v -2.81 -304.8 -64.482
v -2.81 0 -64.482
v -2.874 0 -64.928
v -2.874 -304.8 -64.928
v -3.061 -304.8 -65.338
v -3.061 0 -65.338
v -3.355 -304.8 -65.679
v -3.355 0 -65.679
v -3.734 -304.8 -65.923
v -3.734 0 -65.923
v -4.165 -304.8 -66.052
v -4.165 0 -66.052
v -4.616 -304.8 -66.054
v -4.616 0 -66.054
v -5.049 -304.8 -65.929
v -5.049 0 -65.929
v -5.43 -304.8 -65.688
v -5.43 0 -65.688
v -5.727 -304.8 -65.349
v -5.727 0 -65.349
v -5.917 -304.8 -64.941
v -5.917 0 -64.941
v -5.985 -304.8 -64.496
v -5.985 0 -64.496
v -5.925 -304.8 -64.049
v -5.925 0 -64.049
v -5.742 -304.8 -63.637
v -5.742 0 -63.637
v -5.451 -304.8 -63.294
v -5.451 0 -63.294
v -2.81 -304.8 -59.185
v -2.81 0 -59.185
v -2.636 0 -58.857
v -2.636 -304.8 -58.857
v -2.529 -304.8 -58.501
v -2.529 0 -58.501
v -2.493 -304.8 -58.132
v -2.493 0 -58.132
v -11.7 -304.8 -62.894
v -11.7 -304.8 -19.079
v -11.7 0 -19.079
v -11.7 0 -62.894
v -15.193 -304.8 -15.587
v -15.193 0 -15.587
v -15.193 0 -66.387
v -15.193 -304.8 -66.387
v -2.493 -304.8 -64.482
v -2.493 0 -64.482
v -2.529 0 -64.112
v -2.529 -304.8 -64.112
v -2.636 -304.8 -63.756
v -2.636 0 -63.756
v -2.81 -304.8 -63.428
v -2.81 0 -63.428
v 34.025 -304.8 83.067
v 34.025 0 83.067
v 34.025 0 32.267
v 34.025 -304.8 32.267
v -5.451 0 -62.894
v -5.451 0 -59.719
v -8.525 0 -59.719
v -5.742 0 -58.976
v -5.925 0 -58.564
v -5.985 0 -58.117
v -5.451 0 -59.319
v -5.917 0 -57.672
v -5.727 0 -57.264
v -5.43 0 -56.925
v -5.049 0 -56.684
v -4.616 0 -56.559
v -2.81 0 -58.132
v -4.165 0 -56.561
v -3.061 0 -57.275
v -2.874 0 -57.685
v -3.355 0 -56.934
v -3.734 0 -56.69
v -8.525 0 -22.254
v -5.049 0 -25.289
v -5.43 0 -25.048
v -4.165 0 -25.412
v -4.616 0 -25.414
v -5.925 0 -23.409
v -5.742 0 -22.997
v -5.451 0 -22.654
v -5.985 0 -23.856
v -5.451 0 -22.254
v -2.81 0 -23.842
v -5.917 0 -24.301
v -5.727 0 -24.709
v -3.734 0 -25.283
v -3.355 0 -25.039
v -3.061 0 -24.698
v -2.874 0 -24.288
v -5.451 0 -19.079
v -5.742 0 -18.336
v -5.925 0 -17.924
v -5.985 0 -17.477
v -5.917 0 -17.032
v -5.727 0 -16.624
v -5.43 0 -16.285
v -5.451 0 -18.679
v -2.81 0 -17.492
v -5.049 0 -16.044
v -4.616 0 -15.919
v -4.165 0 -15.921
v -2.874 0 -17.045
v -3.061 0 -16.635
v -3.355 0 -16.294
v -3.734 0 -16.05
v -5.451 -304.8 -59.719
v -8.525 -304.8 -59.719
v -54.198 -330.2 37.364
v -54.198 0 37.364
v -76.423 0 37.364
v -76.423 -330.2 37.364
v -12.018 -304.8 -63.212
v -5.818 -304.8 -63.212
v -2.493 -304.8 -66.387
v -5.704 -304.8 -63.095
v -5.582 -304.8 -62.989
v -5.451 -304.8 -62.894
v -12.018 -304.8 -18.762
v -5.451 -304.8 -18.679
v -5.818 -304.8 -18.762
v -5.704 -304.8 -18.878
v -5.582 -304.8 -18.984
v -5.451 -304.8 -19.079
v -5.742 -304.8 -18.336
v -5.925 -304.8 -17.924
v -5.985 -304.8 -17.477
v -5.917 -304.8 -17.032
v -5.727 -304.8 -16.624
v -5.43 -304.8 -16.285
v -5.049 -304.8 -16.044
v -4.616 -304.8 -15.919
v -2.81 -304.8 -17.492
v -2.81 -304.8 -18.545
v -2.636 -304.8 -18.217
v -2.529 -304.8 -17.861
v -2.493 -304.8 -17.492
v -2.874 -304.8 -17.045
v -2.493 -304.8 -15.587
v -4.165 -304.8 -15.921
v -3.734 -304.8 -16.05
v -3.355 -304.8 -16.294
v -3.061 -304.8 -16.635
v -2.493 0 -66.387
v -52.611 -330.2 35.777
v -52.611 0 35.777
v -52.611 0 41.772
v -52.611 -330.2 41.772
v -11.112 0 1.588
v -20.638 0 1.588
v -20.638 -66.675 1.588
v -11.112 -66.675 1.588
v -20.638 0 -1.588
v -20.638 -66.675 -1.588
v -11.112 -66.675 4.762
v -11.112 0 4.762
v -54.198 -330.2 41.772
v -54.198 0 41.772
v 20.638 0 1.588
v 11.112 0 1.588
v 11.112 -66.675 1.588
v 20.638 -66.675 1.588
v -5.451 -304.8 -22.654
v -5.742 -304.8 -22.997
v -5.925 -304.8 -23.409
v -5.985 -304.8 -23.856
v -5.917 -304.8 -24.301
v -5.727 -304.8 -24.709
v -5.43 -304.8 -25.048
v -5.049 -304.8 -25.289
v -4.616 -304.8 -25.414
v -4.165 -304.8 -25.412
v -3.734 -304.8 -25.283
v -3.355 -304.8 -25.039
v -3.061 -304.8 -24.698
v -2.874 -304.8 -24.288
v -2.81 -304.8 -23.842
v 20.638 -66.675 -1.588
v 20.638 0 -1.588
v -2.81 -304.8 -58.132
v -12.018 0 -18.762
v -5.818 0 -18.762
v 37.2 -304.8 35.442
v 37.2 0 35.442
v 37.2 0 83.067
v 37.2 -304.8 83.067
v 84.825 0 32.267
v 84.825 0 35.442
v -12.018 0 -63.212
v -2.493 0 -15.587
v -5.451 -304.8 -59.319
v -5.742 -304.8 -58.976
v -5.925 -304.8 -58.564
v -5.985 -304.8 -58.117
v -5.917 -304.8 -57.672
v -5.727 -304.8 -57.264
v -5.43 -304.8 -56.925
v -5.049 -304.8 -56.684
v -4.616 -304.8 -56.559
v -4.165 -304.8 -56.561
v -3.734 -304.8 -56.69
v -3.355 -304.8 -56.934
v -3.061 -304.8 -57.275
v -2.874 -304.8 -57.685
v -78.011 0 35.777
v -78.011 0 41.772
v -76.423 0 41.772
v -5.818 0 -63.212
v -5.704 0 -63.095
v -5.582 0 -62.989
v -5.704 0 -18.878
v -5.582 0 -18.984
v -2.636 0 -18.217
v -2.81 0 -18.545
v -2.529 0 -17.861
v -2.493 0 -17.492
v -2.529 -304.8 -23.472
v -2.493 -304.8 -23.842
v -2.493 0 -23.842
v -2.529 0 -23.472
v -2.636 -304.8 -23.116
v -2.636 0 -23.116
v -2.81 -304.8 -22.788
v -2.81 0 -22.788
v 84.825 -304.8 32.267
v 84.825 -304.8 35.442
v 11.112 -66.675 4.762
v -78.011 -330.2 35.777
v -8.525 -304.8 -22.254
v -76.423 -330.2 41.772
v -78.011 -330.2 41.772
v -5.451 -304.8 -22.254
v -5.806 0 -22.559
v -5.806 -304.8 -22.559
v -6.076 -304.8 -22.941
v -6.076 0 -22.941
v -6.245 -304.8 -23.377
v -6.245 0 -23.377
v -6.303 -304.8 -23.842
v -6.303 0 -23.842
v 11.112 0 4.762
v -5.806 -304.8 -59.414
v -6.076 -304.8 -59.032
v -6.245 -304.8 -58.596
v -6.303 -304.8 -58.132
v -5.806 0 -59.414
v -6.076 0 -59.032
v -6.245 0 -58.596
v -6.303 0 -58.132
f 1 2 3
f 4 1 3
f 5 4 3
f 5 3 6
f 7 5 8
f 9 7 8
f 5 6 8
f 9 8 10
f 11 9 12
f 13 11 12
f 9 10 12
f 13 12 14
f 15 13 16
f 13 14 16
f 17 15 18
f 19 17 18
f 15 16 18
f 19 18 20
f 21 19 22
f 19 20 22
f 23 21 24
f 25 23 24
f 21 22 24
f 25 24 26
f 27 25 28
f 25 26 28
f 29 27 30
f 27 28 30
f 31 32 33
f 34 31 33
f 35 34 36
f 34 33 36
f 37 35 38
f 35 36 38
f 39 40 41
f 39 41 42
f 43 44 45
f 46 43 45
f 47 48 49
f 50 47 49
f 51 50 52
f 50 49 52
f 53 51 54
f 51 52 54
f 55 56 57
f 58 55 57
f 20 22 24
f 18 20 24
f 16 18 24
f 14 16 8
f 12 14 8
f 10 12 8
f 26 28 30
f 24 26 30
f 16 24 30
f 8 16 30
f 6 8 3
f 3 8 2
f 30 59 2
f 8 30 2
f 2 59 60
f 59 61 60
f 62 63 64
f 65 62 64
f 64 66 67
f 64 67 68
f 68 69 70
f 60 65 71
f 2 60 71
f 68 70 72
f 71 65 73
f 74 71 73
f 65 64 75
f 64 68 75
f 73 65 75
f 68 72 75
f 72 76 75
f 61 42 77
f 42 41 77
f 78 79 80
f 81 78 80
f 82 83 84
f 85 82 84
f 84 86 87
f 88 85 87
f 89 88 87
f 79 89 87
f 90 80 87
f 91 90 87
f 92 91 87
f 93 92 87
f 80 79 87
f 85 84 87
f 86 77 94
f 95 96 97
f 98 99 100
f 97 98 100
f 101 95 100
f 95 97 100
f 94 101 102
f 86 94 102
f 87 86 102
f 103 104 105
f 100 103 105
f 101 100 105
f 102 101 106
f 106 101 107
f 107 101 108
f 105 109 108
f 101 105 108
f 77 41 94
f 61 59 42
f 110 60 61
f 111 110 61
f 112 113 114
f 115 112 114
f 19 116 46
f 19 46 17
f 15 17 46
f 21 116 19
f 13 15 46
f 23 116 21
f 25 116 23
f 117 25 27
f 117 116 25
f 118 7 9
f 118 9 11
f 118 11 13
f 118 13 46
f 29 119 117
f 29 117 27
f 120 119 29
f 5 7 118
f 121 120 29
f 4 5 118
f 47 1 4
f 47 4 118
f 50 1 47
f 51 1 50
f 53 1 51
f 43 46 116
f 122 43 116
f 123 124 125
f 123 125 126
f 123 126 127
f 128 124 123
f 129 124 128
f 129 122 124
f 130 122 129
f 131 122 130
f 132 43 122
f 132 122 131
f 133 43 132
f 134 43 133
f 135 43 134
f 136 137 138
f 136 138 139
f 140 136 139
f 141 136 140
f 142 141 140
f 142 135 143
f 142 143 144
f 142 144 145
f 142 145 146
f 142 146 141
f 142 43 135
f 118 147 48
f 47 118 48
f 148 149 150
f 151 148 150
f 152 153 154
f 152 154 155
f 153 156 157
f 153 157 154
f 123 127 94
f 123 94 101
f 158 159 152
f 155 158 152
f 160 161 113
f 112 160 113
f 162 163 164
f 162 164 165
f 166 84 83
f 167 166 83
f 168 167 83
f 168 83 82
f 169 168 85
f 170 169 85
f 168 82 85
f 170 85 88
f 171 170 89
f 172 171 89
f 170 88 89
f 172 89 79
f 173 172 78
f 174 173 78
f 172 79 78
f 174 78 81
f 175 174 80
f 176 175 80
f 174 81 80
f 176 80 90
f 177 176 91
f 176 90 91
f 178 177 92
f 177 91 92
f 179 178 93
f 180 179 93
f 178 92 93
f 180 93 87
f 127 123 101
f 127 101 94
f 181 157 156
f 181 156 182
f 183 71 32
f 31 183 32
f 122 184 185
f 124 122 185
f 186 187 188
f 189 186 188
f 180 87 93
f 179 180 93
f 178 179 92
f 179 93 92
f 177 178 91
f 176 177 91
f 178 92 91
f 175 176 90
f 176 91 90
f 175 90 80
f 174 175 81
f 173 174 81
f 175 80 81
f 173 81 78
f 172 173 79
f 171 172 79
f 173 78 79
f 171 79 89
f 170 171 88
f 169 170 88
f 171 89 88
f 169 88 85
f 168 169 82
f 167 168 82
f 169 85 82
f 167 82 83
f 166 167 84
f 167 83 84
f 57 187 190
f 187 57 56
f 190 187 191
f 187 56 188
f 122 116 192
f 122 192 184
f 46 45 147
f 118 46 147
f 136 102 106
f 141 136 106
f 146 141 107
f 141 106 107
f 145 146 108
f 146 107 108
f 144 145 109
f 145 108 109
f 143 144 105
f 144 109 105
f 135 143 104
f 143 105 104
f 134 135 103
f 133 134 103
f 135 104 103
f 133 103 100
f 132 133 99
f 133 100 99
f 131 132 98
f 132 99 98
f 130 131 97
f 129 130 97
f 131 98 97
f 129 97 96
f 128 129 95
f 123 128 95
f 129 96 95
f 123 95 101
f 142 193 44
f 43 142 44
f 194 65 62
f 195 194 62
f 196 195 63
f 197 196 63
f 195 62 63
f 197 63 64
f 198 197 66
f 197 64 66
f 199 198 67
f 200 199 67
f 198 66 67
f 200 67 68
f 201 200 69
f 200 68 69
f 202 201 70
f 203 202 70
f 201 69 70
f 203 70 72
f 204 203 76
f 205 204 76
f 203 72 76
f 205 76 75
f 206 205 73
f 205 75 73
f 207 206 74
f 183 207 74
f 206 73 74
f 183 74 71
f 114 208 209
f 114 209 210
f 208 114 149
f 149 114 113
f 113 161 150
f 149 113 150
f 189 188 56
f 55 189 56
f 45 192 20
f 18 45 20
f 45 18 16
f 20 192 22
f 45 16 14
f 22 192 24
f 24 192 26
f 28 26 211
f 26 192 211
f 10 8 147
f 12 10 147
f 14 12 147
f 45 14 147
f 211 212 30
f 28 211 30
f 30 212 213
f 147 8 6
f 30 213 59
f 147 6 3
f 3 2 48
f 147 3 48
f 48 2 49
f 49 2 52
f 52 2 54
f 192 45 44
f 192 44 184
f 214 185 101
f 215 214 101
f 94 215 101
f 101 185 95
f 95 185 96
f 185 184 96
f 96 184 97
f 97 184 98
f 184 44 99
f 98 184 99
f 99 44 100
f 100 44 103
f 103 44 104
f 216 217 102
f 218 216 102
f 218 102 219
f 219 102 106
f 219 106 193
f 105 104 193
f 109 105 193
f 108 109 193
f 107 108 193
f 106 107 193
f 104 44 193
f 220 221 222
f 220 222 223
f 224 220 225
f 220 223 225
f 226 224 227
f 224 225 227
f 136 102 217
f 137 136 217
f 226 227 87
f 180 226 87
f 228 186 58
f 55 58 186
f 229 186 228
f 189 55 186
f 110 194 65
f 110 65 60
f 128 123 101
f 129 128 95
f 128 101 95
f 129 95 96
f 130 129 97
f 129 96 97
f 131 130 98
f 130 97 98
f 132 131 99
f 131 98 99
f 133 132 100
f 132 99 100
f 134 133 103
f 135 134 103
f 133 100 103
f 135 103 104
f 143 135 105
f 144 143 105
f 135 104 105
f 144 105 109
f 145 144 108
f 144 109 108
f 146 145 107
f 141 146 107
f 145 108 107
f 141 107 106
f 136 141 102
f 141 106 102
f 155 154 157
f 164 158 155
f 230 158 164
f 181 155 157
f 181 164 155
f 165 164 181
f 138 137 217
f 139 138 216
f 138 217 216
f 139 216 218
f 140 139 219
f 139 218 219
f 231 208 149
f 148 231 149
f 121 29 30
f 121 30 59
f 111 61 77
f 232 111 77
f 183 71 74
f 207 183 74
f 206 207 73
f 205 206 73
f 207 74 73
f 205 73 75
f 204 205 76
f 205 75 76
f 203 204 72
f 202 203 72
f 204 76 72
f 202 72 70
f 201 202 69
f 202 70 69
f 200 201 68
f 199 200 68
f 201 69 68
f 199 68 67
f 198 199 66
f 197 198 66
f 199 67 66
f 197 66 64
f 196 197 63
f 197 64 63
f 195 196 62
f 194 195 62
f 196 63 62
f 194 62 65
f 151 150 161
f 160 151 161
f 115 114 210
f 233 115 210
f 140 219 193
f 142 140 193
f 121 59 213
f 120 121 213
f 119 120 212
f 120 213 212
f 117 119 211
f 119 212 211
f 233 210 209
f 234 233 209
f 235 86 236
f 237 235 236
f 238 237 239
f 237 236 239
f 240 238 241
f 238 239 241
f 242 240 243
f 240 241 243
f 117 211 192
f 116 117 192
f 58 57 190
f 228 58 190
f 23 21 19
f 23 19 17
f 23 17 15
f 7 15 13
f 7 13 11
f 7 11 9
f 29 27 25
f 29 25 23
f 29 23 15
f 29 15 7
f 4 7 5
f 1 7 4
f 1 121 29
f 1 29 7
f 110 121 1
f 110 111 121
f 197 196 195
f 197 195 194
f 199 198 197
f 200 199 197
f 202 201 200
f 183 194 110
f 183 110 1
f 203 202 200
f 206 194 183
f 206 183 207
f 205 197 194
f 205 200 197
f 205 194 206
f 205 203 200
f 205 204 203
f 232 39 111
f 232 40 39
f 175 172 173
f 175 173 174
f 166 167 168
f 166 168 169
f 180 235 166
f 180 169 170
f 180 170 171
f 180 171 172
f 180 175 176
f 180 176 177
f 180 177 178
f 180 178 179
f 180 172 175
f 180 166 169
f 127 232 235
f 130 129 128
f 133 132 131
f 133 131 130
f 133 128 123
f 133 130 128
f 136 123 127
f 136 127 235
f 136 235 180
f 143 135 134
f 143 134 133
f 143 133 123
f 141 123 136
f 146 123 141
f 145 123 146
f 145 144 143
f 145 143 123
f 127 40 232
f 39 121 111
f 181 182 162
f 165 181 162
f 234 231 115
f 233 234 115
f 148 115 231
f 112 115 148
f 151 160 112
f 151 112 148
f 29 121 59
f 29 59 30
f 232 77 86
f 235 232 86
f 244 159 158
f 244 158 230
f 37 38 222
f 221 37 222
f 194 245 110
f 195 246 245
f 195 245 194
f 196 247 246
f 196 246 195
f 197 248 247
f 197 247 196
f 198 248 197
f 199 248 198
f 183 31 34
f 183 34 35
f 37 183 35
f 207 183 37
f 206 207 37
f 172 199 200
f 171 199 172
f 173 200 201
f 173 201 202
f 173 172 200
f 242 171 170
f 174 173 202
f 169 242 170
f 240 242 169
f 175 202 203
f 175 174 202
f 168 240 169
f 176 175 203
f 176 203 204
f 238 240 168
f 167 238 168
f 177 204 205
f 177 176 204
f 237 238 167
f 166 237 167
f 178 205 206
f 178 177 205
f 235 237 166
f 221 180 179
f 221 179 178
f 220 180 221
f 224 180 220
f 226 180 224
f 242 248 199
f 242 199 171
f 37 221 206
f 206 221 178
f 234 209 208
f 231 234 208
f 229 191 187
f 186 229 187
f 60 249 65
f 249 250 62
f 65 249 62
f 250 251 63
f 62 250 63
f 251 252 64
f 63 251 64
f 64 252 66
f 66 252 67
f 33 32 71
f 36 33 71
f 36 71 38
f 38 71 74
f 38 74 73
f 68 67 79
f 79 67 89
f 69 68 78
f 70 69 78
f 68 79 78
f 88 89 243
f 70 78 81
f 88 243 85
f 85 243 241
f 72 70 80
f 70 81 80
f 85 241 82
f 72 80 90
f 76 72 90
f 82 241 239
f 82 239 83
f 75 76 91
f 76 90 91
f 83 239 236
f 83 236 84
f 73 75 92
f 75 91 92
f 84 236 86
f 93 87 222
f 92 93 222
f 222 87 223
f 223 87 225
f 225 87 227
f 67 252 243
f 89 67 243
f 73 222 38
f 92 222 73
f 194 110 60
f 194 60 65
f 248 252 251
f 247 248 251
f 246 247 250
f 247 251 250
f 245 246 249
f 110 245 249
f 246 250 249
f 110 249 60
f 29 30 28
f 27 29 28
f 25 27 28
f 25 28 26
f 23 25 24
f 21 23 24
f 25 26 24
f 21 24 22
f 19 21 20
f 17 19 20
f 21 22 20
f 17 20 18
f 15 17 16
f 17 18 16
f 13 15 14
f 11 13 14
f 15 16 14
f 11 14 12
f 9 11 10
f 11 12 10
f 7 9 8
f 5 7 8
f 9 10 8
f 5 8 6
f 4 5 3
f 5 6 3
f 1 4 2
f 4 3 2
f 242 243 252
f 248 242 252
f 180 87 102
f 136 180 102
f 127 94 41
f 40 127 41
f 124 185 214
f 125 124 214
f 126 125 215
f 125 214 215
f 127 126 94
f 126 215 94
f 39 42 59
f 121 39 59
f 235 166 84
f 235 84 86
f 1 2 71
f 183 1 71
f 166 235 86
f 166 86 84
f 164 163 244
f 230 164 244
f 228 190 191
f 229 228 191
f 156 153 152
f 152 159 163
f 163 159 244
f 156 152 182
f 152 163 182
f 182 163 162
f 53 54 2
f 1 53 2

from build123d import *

# Parameters (mm, degrees)
F0_W     = 22.225
F0_H     = 3.175
F0_W_2   = 9.525
F1_DEPTH = 66.675
F3_DEPTH = 330.2
F5_DEPTH = 304.8
F6_W     = 3.175
F6_H     = 18.7325
F7_DEPTH = 304.8
F8_DEPTH = 304.8
F9_DEPTH = 304.8


with BuildPart() as f1:
    # F0 (on Front) → F1 (new body)
    with BuildSketch(Plane.XZ):
        with Locations((0, 3.175)):
            Rectangle(F0_W, F0_H)
        Rectangle(F0_W, F0_H)
        with Locations((-15.875, 0)):
            Rectangle(F0_W_2, F0_H)
        with Locations((15.875, 0)):
            Rectangle(F0_W_2, F0_H)
    extrude(amount=F1_DEPTH)


with BuildPart() as f3:
    # F2 (on Front) → F3 (new body)
    with BuildSketch(Plane.XZ):
        Polygon((-78.0108283877, 35.7766685789), (-52.6108283877, 35.7766685789), (-52.6108283877, 41.7715603303), (-54.1983283877, 41.7715603303), (-54.1983283877, 37.3641685789), (-76.4233283877, 37.3641685789), (-76.4233283877, 41.7715603303), (-78.0108283877, 41.7715603303), align=None)
    extrude(amount=F3_DEPTH)


with BuildPart() as f5:
    # F4 (on Front) → F5 (new body)
    with BuildSketch(Plane.XZ):
        Polygon((34.0249207026, 83.0667410355), (34.0249207026, 32.2667410355), (84.8249207026, 32.2667410355), (84.8249207026, 35.4417410355), (37.1999207026, 35.4417410355), (37.1999207026, 83.0667410355), align=None)
    extrude(amount=F5_DEPTH)


with BuildPart() as f7:
    # F6 (on Front) → F7 (new body)
    with BuildSketch(Plane.XZ):
        with Locations((-10.112649684, -31.6202576473)):
            Rectangle(F6_W, F6_H)
        Polygon((-5.450678055, -22.2540076473), (-5.450678055, -19.0790076473), (-11.700149684, -19.0790076473), (-11.700149684, -22.2540076473), (-8.525149684, -22.2540076473), align=None)
        with BuildLine():
            Line((-2.810149684, -22.7884792763), (-2.810149684, -18.5445360182))
            ThreePointArc((-2.810149684, -18.5445360182), (-4.0197211708, -19.3586431643), (-5.450678055, -19.0790076473))
            Line((-5.450678055, -19.0790076473), (-5.450678055, -22.2540076473))
            ThreePointArc((-5.450678055, -22.2540076473), (-4.0197211708, -21.9743721303), (-2.810149684, -22.7884792763))
        make_face()
        with BuildLine():
            Line((-2.810149684, -18.5445360182), (-2.810149684, -17.4915076473))
            ThreePointArc((-2.810149684, -17.4915076473), (-3.7463150116, -18.9392366946), (-5.450678055, -18.6794838676))
            Line((-5.450678055, -18.6794838676), (-5.450678055, -19.0790076473))
            ThreePointArc((-5.450678055, -19.0790076473), (-4.0197211708, -19.3586431643), (-2.810149684, -18.5445360182))
        make_face()
        with BuildLine():
            ThreePointArc((-5.450678055, -18.6794838676), (-3.7463150116, -18.9392366946), (-2.810149684, -17.4915076473))
            Line((-2.810149684, -17.4915076473), (-5.450678055, -17.4915076473))
            Line((-5.450678055, -17.4915076473), (-5.450678055, -18.6794838676))
        make_face()
        with BuildLine():
            Line((-5.450678055, -17.4915076473), (-2.810149684, -17.4915076473))
            ThreePointArc((-2.810149684, -17.4915076473), (-5.0489843565, -16.0437786), (-5.450678055, -18.6794838676))
            Line((-5.450678055, -18.6794838676), (-5.450678055, -17.4915076473))
        make_face()
        with BuildLine():
            Line((-2.810149684, -23.8415076473), (-2.810149684, -22.7884792763))
            ThreePointArc((-2.810149684, -22.7884792763), (-4.0197211708, -21.9743721303), (-5.450678055, -22.2540076473))
            Line((-5.450678055, -22.2540076473), (-5.450678055, -22.653531427))
            ThreePointArc((-5.450678055, -22.653531427), (-3.7463150116, -22.3937786), (-2.810149684, -23.8415076473))
        make_face()
        with BuildLine():
            Line((-5.450678055, -23.8415076473), (-2.810149684, -23.8415076473))
            ThreePointArc((-2.810149684, -23.8415076473), (-3.7463150116, -22.3937786), (-5.450678055, -22.653531427))
            Line((-5.450678055, -22.653531427), (-5.450678055, -23.8415076473))
        make_face()
        with BuildLine():
            ThreePointArc((-5.450678055, -22.653531427), (-5.0489843565, -25.2892366946), (-2.810149684, -23.8415076473))
            Line((-2.810149684, -23.8415076473), (-5.450678055, -23.8415076473))
            Line((-5.450678055, -23.8415076473), (-5.450678055, -22.653531427))
        make_face()
        with Locations((-10.112649684, -50.3527576473)):
            Rectangle(F6_W, F6_H)
        Polygon((-8.525149684, -59.7190076473), (-11.700149684, -59.7190076473), (-11.700149684, -62.8940076473), (-5.450678055, -62.8940076473), (-5.450678055, -59.7190076473), align=None)
        with BuildLine():
            Line((-2.810149684, -63.4284792763), (-2.810149684, -59.1845360182))
            ThreePointArc((-2.810149684, -59.1845360182), (-4.0197211708, -59.9986431643), (-5.450678055, -59.7190076473))
            Line((-5.450678055, -59.7190076473), (-5.450678055, -62.8940076473))
            ThreePointArc((-5.450678055, -62.8940076473), (-4.0197211708, -62.6143721303), (-2.810149684, -63.4284792763))
        make_face()
        with BuildLine():
            ThreePointArc((-5.450678055, -59.7190076473), (-4.0197211708, -59.9986431643), (-2.810149684, -59.1845360182))
            Line((-2.810149684, -59.1845360182), (-2.810149684, -58.1315076473))
            ThreePointArc((-2.810149684, -58.1315076473), (-3.7463150116, -59.5792366946), (-5.450678055, -59.3194838676))
            Line((-5.450678055, -59.3194838676), (-5.450678055, -59.7190076473))
        make_face()
        with BuildLine():
            ThreePointArc((-5.450678055, -59.3194838676), (-3.7463150116, -59.5792366946), (-2.810149684, -58.1315076473))
            Line((-2.810149684, -58.1315076473), (-5.450678055, -58.1315076473))
            Line((-5.450678055, -58.1315076473), (-5.450678055, -59.3194838676))
        make_face()
        with BuildLine():
            Line((-5.450678055, -58.1315076473), (-2.810149684, -58.1315076473))
            ThreePointArc((-2.810149684, -58.1315076473), (-5.0489843565, -56.6837786), (-5.450678055, -59.3194838676))
            Line((-5.450678055, -59.3194838676), (-5.450678055, -58.1315076473))
        make_face()
        with BuildLine():
            Line((-5.450678055, -64.4815076473), (-2.810149684, -64.4815076473))
            ThreePointArc((-2.810149684, -64.4815076473), (-3.7463150116, -63.0337786), (-5.450678055, -63.293531427))
            Line((-5.450678055, -63.293531427), (-5.450678055, -64.4815076473))
        make_face()
        with BuildLine():
            Line((-2.810149684, -64.4815076473), (-2.810149684, -63.4284792763))
            ThreePointArc((-2.810149684, -63.4284792763), (-4.0197211708, -62.6143721303), (-5.450678055, -62.8940076473))
            Line((-5.450678055, -62.8940076473), (-5.450678055, -63.293531427))
            ThreePointArc((-5.450678055, -63.293531427), (-3.7463150116, -63.0337786), (-2.810149684, -64.4815076473))
        make_face()
        with BuildLine():
            ThreePointArc((-5.450678055, -63.293531427), (-5.0489843565, -65.9292366946), (-2.810149684, -64.4815076473))
            Line((-2.810149684, -64.4815076473), (-5.450678055, -64.4815076473))
            Line((-5.450678055, -64.4815076473), (-5.450678055, -63.293531427))
        make_face()
    extrude(amount=F7_DEPTH)


with BuildPart() as f8:
    # F6 (on Front) → F8 (new body)
    with BuildSketch(Plane.XZ):
        with BuildLine():
            Line((-12.017649684, -18.7615076473), (-5.8175528498, -18.7615076473))
            ThreePointArc((-5.8175528498, -18.7615076473), (-6.1366688041, -16.7137946539), (-4.397649684, -15.5865076473))
            Line((-4.397649684, -15.5865076473), (-15.192649684, -15.5865076473))
            Line((-15.192649684, -15.5865076473), (-15.192649684, -18.7615076473))
            Line((-15.192649684, -18.7615076473), (-12.017649684, -18.7615076473))
        make_face()
        with BuildLine():
            ThreePointArc((-5.450678055, -18.6794838676), (-5.0489843565, -16.0437786), (-2.810149684, -17.4915076473))
            Line((-2.810149684, -17.4915076473), (-2.810149684, -18.5445360182))
            ThreePointArc((-2.810149684, -18.5445360182), (-2.5737510438, -18.0414337787), (-2.492649684, -17.4915076473))
            ThreePointArc((-2.492649684, -17.4915076473), (-3.0506112659, -16.1444692291), (-4.397649684, -15.5865076473))
            ThreePointArc((-4.397649684, -15.5865076473), (-6.1366688041, -16.7137946539), (-5.8175528498, -18.7615076473))
            ThreePointArc((-5.8175528498, -18.7615076473), (-5.6442647645, -18.9319852907), (-5.450678055, -19.0790076473))
            Line((-5.450678055, -19.0790076473), (-5.450678055, -18.6794838676))
        make_face()
        with BuildLine():
            ThreePointArc((-4.397649684, -15.5865076473), (-3.0506112659, -16.1444692291), (-2.492649684, -17.4915076473))
            Line((-2.492649684, -17.4915076473), (-2.492649684, -15.5865076473))
            Line((-2.492649684, -15.5865076473), (-4.397649684, -15.5865076473))
        make_face()
        Polygon((-12.017649684, -19.0790076473), (-12.017649684, -18.7615076473), (-15.192649684, -18.7615076473), (-15.192649684, -40.9865076473), (-12.017649684, -40.9865076473), align=None)
        Polygon((-12.017649684, -62.8940076473), (-12.017649684, -40.9865076473), (-15.192649684, -40.9865076473), (-15.192649684, -63.2115076473), (-12.017649684, -63.2115076473), align=None)
        with BuildLine():
            Line((-12.017649684, -63.2115076473), (-15.192649684, -63.2115076473))
            Line((-15.192649684, -63.2115076473), (-15.192649684, -66.3865076473))
            Line((-15.192649684, -66.3865076473), (-4.397649684, -66.3865076473))
            ThreePointArc((-4.397649684, -66.3865076473), (-6.1366688041, -65.2592206406), (-5.8175528498, -63.2115076473))
            Line((-5.8175528498, -63.2115076473), (-12.017649684, -63.2115076473))
        make_face()
        with BuildLine():
            Line((-2.492649684, -66.3865076473), (-2.492649684, -64.4815076473))
            ThreePointArc((-2.492649684, -64.4815076473), (-3.0506112659, -65.8285460654), (-4.397649684, -66.3865076473))
            Line((-4.397649684, -66.3865076473), (-2.492649684, -66.3865076473))
        make_face()
        with BuildLine():
            ThreePointArc((-4.397649684, -66.3865076473), (-3.0506112659, -65.8285460654), (-2.492649684, -64.4815076473))
            ThreePointArc((-2.492649684, -64.4815076473), (-2.5737510438, -63.9315815159), (-2.810149684, -63.4284792763))
            Line((-2.810149684, -63.4284792763), (-2.810149684, -64.4815076473))
            ThreePointArc((-2.810149684, -64.4815076473), (-5.0489843565, -65.9292366946), (-5.450678055, -63.293531427))
            Line((-5.450678055, -63.293531427), (-5.450678055, -62.8940076473))
            ThreePointArc((-5.450678055, -62.8940076473), (-5.6442647645, -63.0410300038), (-5.8175528498, -63.2115076473))
            ThreePointArc((-5.8175528498, -63.2115076473), (-6.1366688041, -65.2592206406), (-4.397649684, -66.3865076473))
        make_face()
    extrude(amount=F8_DEPTH)


with BuildPart() as f9:
    # F6 (on Front) → F9 (new body)
    with BuildSketch(Plane.XZ):
        with BuildLine():
            Line((-2.492649684, -40.9865076473), (-2.492649684, -23.8415076473))
            ThreePointArc((-2.492649684, -23.8415076473), (-4.397649684, -25.7465076473), (-6.302649684, -23.8415076473))
            Line((-6.302649684, -23.8415076473), (-6.302649684, -40.9865076473))
            Line((-6.302649684, -40.9865076473), (-2.492649684, -40.9865076473))
        make_face()
        with BuildLine():
            ThreePointArc((-2.492649684, -23.8415076473), (-2.5737510438, -23.2915815159), (-2.810149684, -22.7884792763))
            Line((-2.810149684, -22.7884792763), (-2.810149684, -23.8415076473))
            ThreePointArc((-2.810149684, -23.8415076473), (-5.0489843565, -25.2892366946), (-5.450678055, -22.653531427))
            Line((-5.450678055, -22.653531427), (-5.450678055, -22.2540076473))
            ThreePointArc((-5.450678055, -22.2540076473), (-6.0761972774, -22.9406730472), (-6.302649684, -23.8415076473))
            ThreePointArc((-6.302649684, -23.8415076473), (-4.397649684, -25.7465076473), (-2.492649684, -23.8415076473))
        make_face()
        with BuildLine():
            Line((-2.492649684, -58.1315076473), (-2.492649684, -40.9865076473))
            Line((-2.492649684, -40.9865076473), (-6.302649684, -40.9865076473))
            Line((-6.302649684, -40.9865076473), (-6.302649684, -58.1315076473))
            ThreePointArc((-6.302649684, -58.1315076473), (-4.397649684, -56.2265076473), (-2.492649684, -58.1315076473))
        make_face()
        with BuildLine():
            ThreePointArc((-2.810149684, -59.1845360182), (-2.5737510438, -58.6814337787), (-2.492649684, -58.1315076473))
            ThreePointArc((-2.492649684, -58.1315076473), (-4.397649684, -56.2265076473), (-6.302649684, -58.1315076473))
            ThreePointArc((-6.302649684, -58.1315076473), (-6.0761972774, -59.0323422474), (-5.450678055, -59.7190076473))
            Line((-5.450678055, -59.7190076473), (-5.450678055, -59.3194838676))
            ThreePointArc((-5.450678055, -59.3194838676), (-5.0489843565, -56.6837786), (-2.810149684, -58.1315076473))
            Line((-2.810149684, -58.1315076473), (-2.810149684, -59.1845360182))
        make_face()
    extrude(amount=F9_DEPTH)


solid = Compound([f1.part, f3.part, f5.part, f7.part, f8.part, f9.part])
